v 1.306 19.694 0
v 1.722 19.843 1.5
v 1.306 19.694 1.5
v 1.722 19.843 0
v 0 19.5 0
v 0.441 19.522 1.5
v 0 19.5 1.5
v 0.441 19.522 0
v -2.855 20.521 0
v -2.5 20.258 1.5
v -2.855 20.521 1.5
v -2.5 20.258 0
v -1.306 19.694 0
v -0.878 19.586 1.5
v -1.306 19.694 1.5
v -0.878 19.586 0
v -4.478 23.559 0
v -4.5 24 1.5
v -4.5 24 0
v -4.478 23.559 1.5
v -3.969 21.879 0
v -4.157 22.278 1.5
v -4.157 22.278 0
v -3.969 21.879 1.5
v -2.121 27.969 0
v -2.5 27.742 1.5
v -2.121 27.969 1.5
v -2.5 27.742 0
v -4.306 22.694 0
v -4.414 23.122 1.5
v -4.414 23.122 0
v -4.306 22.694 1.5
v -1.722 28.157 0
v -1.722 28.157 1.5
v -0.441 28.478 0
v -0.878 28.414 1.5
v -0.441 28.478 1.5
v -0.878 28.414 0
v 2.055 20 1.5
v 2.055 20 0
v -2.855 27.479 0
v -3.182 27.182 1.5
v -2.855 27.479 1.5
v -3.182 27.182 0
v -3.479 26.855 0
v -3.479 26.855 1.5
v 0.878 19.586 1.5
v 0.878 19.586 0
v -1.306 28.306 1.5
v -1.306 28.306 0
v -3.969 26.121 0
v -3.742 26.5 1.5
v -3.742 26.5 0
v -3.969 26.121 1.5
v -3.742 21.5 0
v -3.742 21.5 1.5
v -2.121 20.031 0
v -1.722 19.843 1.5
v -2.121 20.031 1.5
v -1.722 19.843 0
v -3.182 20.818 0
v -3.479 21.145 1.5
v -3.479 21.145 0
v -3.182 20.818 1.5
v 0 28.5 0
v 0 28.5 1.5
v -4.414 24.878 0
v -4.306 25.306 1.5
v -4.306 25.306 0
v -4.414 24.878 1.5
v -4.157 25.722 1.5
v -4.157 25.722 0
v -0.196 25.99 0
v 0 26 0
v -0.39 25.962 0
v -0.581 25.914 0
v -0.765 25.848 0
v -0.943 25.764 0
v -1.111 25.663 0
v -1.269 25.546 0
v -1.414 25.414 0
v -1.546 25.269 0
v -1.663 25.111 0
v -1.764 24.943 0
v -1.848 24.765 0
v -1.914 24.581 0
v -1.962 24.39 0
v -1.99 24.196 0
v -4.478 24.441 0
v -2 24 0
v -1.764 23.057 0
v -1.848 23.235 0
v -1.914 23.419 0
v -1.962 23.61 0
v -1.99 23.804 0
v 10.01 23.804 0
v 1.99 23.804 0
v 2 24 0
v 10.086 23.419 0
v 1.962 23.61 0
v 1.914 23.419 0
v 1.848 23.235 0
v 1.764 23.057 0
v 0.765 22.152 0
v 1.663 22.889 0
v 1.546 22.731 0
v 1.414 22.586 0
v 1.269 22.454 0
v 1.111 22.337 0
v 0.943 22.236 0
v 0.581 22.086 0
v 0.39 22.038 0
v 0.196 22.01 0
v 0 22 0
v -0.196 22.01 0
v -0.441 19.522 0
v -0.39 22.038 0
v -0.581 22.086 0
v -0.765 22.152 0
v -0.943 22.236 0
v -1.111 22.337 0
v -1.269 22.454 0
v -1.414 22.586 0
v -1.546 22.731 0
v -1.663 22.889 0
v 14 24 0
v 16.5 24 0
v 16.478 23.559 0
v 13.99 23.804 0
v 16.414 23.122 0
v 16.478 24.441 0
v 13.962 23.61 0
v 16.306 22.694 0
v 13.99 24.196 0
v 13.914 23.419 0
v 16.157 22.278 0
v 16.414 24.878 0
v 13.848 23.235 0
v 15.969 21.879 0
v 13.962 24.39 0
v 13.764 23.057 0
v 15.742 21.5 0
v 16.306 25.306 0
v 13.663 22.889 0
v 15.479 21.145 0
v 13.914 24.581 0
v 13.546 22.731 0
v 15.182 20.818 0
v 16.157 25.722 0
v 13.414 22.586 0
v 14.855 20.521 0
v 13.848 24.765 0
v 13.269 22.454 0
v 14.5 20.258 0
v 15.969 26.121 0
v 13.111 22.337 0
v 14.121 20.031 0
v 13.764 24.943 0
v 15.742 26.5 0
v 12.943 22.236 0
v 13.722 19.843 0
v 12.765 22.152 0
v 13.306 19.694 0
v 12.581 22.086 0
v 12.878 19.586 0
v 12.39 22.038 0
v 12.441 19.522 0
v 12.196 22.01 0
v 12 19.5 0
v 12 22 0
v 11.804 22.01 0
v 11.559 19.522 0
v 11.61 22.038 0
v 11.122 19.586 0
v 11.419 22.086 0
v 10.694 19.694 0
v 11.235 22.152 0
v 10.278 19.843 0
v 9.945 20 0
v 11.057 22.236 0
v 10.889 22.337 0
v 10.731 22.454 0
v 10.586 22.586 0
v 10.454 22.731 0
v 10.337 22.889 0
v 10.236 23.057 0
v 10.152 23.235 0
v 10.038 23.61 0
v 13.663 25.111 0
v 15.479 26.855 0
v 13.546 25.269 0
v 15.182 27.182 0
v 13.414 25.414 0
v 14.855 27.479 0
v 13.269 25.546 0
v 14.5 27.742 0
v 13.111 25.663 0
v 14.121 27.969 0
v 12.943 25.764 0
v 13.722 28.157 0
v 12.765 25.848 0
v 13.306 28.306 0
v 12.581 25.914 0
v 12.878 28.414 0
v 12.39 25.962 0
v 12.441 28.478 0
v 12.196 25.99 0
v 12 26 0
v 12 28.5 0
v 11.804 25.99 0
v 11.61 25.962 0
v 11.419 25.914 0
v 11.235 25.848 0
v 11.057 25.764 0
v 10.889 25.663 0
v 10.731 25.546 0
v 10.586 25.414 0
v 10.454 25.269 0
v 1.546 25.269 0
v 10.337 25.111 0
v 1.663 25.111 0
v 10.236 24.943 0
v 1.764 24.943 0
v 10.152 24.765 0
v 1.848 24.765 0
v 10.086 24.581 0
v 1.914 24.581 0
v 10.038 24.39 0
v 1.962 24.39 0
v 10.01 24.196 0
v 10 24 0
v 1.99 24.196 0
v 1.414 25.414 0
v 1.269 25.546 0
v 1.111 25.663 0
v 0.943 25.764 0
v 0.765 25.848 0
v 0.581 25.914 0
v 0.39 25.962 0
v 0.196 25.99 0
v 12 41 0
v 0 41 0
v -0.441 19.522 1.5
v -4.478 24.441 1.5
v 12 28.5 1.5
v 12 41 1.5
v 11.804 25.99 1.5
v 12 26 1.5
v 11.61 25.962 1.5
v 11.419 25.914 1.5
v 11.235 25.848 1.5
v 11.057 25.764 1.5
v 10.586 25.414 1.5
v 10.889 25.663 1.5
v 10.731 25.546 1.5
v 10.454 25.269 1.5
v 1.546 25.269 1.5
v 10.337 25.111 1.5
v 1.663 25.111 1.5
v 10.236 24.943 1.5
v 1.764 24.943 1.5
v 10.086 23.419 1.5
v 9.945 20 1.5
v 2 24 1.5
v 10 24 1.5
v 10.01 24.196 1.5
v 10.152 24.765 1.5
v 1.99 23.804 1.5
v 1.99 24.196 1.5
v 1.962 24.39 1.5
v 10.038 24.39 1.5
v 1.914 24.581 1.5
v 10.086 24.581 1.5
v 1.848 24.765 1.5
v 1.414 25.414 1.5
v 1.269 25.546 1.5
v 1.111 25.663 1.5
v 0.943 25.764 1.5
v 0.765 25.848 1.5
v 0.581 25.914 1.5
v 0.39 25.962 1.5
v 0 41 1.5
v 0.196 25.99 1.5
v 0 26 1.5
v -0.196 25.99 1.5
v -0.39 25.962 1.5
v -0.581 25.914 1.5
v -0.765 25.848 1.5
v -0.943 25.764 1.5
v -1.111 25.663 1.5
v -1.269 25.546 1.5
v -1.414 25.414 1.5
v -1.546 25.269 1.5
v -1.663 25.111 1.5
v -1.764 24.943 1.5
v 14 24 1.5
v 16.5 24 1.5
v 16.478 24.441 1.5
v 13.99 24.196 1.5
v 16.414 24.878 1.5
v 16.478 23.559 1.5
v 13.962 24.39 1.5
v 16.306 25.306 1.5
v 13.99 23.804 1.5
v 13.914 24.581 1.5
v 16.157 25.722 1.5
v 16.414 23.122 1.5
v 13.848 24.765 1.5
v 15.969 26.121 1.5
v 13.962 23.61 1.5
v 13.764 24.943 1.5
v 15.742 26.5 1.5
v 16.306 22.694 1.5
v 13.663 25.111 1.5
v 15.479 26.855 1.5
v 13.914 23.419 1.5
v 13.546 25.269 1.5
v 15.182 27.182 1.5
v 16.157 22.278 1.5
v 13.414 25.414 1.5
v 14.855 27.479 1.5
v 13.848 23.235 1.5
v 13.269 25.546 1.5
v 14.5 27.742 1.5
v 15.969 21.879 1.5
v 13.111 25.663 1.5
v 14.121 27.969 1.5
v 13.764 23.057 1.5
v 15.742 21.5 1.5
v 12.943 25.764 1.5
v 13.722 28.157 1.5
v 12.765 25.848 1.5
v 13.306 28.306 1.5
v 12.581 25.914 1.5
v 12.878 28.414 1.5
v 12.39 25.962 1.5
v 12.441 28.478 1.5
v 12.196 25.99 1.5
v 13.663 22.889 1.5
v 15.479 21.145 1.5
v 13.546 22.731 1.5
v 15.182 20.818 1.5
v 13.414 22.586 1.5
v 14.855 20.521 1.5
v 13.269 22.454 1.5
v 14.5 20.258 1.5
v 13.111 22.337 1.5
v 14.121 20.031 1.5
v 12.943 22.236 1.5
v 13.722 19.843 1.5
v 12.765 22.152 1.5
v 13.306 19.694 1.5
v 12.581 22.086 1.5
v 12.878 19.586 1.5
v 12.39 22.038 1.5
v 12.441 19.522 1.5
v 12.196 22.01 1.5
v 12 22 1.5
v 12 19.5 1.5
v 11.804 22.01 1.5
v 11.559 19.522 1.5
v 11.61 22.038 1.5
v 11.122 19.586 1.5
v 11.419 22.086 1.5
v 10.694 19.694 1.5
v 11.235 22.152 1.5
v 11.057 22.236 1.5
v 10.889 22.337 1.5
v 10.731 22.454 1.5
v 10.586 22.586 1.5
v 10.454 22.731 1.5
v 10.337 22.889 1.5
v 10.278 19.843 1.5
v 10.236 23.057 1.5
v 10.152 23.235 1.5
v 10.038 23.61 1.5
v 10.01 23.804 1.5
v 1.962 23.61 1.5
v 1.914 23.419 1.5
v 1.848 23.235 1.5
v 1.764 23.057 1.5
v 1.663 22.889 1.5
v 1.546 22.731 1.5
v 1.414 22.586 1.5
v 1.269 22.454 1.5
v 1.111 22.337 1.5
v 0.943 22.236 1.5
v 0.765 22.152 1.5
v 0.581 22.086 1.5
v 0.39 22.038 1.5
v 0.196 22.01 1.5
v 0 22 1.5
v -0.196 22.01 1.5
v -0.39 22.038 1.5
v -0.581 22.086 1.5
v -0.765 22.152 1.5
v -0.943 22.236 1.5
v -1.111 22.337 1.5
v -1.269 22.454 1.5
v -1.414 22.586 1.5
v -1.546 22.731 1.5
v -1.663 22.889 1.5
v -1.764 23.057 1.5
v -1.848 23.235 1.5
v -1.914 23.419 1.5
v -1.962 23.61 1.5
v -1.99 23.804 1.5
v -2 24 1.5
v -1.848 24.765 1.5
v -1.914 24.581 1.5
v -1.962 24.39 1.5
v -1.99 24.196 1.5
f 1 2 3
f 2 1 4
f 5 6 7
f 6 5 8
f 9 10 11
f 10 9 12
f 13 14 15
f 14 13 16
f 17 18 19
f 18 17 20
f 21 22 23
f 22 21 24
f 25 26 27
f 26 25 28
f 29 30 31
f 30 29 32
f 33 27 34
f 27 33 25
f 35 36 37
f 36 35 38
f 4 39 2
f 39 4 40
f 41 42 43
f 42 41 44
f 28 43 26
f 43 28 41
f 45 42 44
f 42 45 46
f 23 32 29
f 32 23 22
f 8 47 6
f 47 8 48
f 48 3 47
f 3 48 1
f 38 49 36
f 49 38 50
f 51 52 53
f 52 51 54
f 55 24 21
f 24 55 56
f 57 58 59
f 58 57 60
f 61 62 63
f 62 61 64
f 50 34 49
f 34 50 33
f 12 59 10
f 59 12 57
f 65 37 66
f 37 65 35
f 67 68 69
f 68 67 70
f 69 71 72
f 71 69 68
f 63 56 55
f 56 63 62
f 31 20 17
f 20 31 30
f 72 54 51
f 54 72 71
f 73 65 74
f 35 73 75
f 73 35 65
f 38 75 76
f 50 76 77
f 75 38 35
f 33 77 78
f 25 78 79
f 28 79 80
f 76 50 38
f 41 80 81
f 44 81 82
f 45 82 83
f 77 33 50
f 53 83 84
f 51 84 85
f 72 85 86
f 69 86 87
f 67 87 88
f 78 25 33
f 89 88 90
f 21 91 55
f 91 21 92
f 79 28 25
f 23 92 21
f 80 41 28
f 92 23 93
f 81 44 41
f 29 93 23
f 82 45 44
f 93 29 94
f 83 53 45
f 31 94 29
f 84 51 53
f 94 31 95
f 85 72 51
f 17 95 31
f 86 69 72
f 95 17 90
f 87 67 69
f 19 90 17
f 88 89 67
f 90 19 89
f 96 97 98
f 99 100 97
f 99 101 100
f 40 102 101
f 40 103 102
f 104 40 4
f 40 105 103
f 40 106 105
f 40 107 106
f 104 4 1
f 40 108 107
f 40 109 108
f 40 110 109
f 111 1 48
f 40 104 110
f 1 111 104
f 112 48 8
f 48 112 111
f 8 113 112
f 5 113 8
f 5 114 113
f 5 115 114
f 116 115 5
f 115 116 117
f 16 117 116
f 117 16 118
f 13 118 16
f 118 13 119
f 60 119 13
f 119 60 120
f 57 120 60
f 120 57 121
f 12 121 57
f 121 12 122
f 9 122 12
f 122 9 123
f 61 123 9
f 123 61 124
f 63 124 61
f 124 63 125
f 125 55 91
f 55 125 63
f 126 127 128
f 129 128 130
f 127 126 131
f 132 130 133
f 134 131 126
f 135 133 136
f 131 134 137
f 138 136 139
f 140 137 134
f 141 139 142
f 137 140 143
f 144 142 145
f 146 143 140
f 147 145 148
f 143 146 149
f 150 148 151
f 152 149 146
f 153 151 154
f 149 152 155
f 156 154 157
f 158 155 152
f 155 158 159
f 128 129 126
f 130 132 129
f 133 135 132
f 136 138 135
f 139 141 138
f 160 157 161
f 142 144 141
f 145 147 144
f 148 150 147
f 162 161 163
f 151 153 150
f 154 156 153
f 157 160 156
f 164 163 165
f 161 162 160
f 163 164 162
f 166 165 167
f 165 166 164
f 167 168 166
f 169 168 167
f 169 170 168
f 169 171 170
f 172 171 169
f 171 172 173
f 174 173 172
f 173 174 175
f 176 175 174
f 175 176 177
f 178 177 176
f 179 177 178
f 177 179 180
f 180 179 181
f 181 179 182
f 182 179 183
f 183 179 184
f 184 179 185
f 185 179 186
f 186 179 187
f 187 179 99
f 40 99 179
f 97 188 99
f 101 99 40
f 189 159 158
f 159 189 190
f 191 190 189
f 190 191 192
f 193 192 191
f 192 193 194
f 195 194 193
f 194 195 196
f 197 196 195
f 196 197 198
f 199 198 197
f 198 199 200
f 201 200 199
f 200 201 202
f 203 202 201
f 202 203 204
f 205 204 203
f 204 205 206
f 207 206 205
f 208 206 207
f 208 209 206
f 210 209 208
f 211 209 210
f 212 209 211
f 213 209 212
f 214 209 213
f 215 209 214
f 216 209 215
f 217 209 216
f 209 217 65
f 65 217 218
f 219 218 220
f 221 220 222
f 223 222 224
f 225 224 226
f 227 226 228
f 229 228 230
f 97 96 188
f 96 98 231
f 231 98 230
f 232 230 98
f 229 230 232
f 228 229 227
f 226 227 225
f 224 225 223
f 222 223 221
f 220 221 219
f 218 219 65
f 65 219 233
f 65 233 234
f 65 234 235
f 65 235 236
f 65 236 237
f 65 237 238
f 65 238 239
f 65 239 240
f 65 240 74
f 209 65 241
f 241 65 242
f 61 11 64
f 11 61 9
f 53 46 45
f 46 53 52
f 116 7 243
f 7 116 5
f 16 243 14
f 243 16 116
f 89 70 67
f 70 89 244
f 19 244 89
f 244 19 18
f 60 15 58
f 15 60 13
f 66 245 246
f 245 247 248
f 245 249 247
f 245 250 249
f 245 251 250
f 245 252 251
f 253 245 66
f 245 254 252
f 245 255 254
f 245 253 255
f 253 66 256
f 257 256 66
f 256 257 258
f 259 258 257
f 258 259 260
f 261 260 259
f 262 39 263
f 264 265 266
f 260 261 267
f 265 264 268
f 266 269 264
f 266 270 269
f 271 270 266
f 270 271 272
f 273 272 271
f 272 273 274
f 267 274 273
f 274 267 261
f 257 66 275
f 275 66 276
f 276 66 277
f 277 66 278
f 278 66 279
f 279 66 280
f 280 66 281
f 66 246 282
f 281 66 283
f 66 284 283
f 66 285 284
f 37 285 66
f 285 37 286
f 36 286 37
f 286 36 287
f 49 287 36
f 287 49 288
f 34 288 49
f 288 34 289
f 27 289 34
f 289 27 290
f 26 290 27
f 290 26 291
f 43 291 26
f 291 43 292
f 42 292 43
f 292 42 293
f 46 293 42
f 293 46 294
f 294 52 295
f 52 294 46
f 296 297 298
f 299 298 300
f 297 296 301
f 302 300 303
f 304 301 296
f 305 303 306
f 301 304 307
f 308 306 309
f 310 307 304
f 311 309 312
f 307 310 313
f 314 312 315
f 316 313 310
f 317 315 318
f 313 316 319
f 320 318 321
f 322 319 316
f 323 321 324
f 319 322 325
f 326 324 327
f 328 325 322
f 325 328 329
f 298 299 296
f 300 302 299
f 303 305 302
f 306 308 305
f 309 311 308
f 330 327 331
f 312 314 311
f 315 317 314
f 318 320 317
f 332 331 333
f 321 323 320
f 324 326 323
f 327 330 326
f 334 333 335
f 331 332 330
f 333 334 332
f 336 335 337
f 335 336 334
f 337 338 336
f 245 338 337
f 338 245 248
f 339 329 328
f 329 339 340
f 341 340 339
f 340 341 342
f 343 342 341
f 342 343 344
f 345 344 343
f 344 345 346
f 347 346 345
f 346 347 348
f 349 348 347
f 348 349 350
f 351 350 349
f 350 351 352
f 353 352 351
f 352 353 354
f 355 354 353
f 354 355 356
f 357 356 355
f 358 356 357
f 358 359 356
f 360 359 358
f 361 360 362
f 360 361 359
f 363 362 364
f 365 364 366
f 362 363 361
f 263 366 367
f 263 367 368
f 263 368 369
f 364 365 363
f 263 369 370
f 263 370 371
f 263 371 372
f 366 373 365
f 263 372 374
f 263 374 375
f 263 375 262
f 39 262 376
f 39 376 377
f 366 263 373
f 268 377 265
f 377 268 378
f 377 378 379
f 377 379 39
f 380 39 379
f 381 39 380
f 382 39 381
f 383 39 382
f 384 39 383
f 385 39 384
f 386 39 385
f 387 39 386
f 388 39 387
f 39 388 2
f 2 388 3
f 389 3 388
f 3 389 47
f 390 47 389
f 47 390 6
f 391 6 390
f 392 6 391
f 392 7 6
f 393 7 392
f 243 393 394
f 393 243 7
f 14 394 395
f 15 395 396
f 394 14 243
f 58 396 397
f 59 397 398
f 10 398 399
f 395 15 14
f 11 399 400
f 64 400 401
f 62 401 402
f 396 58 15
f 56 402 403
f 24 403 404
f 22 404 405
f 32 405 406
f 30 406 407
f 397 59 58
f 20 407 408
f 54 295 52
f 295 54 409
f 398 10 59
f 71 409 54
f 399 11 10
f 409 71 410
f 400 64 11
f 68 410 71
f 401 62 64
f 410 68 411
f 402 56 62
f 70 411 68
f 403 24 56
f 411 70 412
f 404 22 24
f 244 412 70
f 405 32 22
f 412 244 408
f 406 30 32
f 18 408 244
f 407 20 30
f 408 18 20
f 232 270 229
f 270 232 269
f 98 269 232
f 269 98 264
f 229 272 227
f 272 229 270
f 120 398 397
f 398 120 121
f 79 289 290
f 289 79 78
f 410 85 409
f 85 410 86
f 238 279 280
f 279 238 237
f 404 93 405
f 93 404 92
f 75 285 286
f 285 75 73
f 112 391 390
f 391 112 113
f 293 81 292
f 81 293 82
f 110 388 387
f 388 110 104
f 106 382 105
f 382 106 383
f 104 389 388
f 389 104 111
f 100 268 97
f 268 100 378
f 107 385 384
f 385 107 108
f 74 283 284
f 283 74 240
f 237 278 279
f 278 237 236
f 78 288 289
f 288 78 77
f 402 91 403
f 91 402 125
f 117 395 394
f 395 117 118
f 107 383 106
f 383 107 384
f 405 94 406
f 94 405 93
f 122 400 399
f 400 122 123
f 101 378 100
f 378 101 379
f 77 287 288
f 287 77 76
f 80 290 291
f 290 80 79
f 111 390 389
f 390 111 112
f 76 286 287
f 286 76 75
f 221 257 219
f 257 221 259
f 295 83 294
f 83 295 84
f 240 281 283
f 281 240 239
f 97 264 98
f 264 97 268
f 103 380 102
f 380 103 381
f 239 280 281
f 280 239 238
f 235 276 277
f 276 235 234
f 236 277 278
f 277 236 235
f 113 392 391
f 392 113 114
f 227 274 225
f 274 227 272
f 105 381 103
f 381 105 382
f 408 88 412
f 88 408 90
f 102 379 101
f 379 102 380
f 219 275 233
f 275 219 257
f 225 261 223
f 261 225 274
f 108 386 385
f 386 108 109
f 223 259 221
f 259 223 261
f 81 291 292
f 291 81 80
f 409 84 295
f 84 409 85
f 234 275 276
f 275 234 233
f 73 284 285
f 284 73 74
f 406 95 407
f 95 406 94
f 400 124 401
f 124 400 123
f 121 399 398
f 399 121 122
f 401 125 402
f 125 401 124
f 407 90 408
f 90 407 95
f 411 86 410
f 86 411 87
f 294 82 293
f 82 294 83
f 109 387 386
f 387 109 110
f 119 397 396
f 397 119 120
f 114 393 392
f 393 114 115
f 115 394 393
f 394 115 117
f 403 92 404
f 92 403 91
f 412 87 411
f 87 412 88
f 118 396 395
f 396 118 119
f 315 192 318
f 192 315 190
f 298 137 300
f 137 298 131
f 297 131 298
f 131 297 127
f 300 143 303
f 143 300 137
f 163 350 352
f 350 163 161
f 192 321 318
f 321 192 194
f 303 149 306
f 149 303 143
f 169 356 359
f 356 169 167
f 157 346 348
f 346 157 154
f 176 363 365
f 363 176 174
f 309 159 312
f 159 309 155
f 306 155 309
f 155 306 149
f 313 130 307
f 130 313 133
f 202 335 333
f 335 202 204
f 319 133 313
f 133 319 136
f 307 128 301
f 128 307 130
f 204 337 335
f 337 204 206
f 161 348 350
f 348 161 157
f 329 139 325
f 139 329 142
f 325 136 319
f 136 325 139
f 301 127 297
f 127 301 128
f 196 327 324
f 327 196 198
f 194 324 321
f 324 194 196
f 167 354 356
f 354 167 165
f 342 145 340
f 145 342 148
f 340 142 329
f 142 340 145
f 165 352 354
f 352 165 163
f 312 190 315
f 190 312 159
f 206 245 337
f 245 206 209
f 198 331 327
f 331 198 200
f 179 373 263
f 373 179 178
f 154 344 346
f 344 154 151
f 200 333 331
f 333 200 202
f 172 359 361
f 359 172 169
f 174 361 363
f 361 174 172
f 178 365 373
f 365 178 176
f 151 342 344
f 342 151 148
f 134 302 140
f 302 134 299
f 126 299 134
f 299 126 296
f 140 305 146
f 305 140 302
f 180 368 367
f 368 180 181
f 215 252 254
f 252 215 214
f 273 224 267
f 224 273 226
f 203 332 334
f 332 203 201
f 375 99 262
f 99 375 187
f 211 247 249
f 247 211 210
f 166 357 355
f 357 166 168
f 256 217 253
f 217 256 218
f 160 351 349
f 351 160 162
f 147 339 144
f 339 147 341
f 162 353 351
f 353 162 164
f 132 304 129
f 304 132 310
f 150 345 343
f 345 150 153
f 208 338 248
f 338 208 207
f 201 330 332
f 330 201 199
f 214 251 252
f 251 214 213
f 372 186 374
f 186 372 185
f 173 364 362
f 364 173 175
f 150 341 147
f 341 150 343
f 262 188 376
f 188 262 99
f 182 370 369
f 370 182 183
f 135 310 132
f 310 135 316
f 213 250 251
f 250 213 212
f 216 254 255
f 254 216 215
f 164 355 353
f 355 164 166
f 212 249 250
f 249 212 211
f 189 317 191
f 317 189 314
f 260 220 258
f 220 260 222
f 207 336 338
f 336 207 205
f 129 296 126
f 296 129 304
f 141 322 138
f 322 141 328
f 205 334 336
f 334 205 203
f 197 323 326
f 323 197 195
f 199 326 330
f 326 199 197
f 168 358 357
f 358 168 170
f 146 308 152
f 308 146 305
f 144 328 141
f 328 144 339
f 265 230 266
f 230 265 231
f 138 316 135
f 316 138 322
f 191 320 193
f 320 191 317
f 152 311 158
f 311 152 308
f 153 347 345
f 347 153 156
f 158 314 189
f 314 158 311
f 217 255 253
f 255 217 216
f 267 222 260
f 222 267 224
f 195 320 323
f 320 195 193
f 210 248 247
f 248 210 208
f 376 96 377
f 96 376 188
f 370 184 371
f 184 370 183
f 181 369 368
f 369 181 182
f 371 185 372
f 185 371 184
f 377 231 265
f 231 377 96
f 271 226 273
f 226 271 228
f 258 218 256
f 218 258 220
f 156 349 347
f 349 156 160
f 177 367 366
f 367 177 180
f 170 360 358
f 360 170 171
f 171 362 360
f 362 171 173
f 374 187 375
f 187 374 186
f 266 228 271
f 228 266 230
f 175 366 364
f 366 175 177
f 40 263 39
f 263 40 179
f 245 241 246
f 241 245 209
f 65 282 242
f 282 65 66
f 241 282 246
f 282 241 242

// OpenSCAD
$fn=64;

module bed_spring_washer(){
    //washers for the springs on the bed
    large_dia=11;
    small_dia=7;
    thickness=1.5;
    thickness_small=thickness*2;
    hole=3.5;

    difference(){
        union(){
            cylinder(d=small_dia,h=thickness_small);
            cylinder(d=large_dia,h=thickness);
        }
        cylinder(d=hole,h=thickness_small);
    }

}

module extruder_tensioner_washer(){
    dia=9;
    hole=4;
    thickness=1.5;
    
    difference(){
        cylinder(d=dia,h=thickness);
        cylinder(d=hole,h=thickness);
    }
}

//for (i=[0:7])translate([(i%4)*12,(i-i%4)*3,0])bed_spring_washer();
union(){
    translate([2,20])cube([8,8,1.5]);    
    translate([0,26])cube([12,15,1.5]);   
    for (i=[0:12:20])translate([i,24])extruder_tensioner_washer();
}
